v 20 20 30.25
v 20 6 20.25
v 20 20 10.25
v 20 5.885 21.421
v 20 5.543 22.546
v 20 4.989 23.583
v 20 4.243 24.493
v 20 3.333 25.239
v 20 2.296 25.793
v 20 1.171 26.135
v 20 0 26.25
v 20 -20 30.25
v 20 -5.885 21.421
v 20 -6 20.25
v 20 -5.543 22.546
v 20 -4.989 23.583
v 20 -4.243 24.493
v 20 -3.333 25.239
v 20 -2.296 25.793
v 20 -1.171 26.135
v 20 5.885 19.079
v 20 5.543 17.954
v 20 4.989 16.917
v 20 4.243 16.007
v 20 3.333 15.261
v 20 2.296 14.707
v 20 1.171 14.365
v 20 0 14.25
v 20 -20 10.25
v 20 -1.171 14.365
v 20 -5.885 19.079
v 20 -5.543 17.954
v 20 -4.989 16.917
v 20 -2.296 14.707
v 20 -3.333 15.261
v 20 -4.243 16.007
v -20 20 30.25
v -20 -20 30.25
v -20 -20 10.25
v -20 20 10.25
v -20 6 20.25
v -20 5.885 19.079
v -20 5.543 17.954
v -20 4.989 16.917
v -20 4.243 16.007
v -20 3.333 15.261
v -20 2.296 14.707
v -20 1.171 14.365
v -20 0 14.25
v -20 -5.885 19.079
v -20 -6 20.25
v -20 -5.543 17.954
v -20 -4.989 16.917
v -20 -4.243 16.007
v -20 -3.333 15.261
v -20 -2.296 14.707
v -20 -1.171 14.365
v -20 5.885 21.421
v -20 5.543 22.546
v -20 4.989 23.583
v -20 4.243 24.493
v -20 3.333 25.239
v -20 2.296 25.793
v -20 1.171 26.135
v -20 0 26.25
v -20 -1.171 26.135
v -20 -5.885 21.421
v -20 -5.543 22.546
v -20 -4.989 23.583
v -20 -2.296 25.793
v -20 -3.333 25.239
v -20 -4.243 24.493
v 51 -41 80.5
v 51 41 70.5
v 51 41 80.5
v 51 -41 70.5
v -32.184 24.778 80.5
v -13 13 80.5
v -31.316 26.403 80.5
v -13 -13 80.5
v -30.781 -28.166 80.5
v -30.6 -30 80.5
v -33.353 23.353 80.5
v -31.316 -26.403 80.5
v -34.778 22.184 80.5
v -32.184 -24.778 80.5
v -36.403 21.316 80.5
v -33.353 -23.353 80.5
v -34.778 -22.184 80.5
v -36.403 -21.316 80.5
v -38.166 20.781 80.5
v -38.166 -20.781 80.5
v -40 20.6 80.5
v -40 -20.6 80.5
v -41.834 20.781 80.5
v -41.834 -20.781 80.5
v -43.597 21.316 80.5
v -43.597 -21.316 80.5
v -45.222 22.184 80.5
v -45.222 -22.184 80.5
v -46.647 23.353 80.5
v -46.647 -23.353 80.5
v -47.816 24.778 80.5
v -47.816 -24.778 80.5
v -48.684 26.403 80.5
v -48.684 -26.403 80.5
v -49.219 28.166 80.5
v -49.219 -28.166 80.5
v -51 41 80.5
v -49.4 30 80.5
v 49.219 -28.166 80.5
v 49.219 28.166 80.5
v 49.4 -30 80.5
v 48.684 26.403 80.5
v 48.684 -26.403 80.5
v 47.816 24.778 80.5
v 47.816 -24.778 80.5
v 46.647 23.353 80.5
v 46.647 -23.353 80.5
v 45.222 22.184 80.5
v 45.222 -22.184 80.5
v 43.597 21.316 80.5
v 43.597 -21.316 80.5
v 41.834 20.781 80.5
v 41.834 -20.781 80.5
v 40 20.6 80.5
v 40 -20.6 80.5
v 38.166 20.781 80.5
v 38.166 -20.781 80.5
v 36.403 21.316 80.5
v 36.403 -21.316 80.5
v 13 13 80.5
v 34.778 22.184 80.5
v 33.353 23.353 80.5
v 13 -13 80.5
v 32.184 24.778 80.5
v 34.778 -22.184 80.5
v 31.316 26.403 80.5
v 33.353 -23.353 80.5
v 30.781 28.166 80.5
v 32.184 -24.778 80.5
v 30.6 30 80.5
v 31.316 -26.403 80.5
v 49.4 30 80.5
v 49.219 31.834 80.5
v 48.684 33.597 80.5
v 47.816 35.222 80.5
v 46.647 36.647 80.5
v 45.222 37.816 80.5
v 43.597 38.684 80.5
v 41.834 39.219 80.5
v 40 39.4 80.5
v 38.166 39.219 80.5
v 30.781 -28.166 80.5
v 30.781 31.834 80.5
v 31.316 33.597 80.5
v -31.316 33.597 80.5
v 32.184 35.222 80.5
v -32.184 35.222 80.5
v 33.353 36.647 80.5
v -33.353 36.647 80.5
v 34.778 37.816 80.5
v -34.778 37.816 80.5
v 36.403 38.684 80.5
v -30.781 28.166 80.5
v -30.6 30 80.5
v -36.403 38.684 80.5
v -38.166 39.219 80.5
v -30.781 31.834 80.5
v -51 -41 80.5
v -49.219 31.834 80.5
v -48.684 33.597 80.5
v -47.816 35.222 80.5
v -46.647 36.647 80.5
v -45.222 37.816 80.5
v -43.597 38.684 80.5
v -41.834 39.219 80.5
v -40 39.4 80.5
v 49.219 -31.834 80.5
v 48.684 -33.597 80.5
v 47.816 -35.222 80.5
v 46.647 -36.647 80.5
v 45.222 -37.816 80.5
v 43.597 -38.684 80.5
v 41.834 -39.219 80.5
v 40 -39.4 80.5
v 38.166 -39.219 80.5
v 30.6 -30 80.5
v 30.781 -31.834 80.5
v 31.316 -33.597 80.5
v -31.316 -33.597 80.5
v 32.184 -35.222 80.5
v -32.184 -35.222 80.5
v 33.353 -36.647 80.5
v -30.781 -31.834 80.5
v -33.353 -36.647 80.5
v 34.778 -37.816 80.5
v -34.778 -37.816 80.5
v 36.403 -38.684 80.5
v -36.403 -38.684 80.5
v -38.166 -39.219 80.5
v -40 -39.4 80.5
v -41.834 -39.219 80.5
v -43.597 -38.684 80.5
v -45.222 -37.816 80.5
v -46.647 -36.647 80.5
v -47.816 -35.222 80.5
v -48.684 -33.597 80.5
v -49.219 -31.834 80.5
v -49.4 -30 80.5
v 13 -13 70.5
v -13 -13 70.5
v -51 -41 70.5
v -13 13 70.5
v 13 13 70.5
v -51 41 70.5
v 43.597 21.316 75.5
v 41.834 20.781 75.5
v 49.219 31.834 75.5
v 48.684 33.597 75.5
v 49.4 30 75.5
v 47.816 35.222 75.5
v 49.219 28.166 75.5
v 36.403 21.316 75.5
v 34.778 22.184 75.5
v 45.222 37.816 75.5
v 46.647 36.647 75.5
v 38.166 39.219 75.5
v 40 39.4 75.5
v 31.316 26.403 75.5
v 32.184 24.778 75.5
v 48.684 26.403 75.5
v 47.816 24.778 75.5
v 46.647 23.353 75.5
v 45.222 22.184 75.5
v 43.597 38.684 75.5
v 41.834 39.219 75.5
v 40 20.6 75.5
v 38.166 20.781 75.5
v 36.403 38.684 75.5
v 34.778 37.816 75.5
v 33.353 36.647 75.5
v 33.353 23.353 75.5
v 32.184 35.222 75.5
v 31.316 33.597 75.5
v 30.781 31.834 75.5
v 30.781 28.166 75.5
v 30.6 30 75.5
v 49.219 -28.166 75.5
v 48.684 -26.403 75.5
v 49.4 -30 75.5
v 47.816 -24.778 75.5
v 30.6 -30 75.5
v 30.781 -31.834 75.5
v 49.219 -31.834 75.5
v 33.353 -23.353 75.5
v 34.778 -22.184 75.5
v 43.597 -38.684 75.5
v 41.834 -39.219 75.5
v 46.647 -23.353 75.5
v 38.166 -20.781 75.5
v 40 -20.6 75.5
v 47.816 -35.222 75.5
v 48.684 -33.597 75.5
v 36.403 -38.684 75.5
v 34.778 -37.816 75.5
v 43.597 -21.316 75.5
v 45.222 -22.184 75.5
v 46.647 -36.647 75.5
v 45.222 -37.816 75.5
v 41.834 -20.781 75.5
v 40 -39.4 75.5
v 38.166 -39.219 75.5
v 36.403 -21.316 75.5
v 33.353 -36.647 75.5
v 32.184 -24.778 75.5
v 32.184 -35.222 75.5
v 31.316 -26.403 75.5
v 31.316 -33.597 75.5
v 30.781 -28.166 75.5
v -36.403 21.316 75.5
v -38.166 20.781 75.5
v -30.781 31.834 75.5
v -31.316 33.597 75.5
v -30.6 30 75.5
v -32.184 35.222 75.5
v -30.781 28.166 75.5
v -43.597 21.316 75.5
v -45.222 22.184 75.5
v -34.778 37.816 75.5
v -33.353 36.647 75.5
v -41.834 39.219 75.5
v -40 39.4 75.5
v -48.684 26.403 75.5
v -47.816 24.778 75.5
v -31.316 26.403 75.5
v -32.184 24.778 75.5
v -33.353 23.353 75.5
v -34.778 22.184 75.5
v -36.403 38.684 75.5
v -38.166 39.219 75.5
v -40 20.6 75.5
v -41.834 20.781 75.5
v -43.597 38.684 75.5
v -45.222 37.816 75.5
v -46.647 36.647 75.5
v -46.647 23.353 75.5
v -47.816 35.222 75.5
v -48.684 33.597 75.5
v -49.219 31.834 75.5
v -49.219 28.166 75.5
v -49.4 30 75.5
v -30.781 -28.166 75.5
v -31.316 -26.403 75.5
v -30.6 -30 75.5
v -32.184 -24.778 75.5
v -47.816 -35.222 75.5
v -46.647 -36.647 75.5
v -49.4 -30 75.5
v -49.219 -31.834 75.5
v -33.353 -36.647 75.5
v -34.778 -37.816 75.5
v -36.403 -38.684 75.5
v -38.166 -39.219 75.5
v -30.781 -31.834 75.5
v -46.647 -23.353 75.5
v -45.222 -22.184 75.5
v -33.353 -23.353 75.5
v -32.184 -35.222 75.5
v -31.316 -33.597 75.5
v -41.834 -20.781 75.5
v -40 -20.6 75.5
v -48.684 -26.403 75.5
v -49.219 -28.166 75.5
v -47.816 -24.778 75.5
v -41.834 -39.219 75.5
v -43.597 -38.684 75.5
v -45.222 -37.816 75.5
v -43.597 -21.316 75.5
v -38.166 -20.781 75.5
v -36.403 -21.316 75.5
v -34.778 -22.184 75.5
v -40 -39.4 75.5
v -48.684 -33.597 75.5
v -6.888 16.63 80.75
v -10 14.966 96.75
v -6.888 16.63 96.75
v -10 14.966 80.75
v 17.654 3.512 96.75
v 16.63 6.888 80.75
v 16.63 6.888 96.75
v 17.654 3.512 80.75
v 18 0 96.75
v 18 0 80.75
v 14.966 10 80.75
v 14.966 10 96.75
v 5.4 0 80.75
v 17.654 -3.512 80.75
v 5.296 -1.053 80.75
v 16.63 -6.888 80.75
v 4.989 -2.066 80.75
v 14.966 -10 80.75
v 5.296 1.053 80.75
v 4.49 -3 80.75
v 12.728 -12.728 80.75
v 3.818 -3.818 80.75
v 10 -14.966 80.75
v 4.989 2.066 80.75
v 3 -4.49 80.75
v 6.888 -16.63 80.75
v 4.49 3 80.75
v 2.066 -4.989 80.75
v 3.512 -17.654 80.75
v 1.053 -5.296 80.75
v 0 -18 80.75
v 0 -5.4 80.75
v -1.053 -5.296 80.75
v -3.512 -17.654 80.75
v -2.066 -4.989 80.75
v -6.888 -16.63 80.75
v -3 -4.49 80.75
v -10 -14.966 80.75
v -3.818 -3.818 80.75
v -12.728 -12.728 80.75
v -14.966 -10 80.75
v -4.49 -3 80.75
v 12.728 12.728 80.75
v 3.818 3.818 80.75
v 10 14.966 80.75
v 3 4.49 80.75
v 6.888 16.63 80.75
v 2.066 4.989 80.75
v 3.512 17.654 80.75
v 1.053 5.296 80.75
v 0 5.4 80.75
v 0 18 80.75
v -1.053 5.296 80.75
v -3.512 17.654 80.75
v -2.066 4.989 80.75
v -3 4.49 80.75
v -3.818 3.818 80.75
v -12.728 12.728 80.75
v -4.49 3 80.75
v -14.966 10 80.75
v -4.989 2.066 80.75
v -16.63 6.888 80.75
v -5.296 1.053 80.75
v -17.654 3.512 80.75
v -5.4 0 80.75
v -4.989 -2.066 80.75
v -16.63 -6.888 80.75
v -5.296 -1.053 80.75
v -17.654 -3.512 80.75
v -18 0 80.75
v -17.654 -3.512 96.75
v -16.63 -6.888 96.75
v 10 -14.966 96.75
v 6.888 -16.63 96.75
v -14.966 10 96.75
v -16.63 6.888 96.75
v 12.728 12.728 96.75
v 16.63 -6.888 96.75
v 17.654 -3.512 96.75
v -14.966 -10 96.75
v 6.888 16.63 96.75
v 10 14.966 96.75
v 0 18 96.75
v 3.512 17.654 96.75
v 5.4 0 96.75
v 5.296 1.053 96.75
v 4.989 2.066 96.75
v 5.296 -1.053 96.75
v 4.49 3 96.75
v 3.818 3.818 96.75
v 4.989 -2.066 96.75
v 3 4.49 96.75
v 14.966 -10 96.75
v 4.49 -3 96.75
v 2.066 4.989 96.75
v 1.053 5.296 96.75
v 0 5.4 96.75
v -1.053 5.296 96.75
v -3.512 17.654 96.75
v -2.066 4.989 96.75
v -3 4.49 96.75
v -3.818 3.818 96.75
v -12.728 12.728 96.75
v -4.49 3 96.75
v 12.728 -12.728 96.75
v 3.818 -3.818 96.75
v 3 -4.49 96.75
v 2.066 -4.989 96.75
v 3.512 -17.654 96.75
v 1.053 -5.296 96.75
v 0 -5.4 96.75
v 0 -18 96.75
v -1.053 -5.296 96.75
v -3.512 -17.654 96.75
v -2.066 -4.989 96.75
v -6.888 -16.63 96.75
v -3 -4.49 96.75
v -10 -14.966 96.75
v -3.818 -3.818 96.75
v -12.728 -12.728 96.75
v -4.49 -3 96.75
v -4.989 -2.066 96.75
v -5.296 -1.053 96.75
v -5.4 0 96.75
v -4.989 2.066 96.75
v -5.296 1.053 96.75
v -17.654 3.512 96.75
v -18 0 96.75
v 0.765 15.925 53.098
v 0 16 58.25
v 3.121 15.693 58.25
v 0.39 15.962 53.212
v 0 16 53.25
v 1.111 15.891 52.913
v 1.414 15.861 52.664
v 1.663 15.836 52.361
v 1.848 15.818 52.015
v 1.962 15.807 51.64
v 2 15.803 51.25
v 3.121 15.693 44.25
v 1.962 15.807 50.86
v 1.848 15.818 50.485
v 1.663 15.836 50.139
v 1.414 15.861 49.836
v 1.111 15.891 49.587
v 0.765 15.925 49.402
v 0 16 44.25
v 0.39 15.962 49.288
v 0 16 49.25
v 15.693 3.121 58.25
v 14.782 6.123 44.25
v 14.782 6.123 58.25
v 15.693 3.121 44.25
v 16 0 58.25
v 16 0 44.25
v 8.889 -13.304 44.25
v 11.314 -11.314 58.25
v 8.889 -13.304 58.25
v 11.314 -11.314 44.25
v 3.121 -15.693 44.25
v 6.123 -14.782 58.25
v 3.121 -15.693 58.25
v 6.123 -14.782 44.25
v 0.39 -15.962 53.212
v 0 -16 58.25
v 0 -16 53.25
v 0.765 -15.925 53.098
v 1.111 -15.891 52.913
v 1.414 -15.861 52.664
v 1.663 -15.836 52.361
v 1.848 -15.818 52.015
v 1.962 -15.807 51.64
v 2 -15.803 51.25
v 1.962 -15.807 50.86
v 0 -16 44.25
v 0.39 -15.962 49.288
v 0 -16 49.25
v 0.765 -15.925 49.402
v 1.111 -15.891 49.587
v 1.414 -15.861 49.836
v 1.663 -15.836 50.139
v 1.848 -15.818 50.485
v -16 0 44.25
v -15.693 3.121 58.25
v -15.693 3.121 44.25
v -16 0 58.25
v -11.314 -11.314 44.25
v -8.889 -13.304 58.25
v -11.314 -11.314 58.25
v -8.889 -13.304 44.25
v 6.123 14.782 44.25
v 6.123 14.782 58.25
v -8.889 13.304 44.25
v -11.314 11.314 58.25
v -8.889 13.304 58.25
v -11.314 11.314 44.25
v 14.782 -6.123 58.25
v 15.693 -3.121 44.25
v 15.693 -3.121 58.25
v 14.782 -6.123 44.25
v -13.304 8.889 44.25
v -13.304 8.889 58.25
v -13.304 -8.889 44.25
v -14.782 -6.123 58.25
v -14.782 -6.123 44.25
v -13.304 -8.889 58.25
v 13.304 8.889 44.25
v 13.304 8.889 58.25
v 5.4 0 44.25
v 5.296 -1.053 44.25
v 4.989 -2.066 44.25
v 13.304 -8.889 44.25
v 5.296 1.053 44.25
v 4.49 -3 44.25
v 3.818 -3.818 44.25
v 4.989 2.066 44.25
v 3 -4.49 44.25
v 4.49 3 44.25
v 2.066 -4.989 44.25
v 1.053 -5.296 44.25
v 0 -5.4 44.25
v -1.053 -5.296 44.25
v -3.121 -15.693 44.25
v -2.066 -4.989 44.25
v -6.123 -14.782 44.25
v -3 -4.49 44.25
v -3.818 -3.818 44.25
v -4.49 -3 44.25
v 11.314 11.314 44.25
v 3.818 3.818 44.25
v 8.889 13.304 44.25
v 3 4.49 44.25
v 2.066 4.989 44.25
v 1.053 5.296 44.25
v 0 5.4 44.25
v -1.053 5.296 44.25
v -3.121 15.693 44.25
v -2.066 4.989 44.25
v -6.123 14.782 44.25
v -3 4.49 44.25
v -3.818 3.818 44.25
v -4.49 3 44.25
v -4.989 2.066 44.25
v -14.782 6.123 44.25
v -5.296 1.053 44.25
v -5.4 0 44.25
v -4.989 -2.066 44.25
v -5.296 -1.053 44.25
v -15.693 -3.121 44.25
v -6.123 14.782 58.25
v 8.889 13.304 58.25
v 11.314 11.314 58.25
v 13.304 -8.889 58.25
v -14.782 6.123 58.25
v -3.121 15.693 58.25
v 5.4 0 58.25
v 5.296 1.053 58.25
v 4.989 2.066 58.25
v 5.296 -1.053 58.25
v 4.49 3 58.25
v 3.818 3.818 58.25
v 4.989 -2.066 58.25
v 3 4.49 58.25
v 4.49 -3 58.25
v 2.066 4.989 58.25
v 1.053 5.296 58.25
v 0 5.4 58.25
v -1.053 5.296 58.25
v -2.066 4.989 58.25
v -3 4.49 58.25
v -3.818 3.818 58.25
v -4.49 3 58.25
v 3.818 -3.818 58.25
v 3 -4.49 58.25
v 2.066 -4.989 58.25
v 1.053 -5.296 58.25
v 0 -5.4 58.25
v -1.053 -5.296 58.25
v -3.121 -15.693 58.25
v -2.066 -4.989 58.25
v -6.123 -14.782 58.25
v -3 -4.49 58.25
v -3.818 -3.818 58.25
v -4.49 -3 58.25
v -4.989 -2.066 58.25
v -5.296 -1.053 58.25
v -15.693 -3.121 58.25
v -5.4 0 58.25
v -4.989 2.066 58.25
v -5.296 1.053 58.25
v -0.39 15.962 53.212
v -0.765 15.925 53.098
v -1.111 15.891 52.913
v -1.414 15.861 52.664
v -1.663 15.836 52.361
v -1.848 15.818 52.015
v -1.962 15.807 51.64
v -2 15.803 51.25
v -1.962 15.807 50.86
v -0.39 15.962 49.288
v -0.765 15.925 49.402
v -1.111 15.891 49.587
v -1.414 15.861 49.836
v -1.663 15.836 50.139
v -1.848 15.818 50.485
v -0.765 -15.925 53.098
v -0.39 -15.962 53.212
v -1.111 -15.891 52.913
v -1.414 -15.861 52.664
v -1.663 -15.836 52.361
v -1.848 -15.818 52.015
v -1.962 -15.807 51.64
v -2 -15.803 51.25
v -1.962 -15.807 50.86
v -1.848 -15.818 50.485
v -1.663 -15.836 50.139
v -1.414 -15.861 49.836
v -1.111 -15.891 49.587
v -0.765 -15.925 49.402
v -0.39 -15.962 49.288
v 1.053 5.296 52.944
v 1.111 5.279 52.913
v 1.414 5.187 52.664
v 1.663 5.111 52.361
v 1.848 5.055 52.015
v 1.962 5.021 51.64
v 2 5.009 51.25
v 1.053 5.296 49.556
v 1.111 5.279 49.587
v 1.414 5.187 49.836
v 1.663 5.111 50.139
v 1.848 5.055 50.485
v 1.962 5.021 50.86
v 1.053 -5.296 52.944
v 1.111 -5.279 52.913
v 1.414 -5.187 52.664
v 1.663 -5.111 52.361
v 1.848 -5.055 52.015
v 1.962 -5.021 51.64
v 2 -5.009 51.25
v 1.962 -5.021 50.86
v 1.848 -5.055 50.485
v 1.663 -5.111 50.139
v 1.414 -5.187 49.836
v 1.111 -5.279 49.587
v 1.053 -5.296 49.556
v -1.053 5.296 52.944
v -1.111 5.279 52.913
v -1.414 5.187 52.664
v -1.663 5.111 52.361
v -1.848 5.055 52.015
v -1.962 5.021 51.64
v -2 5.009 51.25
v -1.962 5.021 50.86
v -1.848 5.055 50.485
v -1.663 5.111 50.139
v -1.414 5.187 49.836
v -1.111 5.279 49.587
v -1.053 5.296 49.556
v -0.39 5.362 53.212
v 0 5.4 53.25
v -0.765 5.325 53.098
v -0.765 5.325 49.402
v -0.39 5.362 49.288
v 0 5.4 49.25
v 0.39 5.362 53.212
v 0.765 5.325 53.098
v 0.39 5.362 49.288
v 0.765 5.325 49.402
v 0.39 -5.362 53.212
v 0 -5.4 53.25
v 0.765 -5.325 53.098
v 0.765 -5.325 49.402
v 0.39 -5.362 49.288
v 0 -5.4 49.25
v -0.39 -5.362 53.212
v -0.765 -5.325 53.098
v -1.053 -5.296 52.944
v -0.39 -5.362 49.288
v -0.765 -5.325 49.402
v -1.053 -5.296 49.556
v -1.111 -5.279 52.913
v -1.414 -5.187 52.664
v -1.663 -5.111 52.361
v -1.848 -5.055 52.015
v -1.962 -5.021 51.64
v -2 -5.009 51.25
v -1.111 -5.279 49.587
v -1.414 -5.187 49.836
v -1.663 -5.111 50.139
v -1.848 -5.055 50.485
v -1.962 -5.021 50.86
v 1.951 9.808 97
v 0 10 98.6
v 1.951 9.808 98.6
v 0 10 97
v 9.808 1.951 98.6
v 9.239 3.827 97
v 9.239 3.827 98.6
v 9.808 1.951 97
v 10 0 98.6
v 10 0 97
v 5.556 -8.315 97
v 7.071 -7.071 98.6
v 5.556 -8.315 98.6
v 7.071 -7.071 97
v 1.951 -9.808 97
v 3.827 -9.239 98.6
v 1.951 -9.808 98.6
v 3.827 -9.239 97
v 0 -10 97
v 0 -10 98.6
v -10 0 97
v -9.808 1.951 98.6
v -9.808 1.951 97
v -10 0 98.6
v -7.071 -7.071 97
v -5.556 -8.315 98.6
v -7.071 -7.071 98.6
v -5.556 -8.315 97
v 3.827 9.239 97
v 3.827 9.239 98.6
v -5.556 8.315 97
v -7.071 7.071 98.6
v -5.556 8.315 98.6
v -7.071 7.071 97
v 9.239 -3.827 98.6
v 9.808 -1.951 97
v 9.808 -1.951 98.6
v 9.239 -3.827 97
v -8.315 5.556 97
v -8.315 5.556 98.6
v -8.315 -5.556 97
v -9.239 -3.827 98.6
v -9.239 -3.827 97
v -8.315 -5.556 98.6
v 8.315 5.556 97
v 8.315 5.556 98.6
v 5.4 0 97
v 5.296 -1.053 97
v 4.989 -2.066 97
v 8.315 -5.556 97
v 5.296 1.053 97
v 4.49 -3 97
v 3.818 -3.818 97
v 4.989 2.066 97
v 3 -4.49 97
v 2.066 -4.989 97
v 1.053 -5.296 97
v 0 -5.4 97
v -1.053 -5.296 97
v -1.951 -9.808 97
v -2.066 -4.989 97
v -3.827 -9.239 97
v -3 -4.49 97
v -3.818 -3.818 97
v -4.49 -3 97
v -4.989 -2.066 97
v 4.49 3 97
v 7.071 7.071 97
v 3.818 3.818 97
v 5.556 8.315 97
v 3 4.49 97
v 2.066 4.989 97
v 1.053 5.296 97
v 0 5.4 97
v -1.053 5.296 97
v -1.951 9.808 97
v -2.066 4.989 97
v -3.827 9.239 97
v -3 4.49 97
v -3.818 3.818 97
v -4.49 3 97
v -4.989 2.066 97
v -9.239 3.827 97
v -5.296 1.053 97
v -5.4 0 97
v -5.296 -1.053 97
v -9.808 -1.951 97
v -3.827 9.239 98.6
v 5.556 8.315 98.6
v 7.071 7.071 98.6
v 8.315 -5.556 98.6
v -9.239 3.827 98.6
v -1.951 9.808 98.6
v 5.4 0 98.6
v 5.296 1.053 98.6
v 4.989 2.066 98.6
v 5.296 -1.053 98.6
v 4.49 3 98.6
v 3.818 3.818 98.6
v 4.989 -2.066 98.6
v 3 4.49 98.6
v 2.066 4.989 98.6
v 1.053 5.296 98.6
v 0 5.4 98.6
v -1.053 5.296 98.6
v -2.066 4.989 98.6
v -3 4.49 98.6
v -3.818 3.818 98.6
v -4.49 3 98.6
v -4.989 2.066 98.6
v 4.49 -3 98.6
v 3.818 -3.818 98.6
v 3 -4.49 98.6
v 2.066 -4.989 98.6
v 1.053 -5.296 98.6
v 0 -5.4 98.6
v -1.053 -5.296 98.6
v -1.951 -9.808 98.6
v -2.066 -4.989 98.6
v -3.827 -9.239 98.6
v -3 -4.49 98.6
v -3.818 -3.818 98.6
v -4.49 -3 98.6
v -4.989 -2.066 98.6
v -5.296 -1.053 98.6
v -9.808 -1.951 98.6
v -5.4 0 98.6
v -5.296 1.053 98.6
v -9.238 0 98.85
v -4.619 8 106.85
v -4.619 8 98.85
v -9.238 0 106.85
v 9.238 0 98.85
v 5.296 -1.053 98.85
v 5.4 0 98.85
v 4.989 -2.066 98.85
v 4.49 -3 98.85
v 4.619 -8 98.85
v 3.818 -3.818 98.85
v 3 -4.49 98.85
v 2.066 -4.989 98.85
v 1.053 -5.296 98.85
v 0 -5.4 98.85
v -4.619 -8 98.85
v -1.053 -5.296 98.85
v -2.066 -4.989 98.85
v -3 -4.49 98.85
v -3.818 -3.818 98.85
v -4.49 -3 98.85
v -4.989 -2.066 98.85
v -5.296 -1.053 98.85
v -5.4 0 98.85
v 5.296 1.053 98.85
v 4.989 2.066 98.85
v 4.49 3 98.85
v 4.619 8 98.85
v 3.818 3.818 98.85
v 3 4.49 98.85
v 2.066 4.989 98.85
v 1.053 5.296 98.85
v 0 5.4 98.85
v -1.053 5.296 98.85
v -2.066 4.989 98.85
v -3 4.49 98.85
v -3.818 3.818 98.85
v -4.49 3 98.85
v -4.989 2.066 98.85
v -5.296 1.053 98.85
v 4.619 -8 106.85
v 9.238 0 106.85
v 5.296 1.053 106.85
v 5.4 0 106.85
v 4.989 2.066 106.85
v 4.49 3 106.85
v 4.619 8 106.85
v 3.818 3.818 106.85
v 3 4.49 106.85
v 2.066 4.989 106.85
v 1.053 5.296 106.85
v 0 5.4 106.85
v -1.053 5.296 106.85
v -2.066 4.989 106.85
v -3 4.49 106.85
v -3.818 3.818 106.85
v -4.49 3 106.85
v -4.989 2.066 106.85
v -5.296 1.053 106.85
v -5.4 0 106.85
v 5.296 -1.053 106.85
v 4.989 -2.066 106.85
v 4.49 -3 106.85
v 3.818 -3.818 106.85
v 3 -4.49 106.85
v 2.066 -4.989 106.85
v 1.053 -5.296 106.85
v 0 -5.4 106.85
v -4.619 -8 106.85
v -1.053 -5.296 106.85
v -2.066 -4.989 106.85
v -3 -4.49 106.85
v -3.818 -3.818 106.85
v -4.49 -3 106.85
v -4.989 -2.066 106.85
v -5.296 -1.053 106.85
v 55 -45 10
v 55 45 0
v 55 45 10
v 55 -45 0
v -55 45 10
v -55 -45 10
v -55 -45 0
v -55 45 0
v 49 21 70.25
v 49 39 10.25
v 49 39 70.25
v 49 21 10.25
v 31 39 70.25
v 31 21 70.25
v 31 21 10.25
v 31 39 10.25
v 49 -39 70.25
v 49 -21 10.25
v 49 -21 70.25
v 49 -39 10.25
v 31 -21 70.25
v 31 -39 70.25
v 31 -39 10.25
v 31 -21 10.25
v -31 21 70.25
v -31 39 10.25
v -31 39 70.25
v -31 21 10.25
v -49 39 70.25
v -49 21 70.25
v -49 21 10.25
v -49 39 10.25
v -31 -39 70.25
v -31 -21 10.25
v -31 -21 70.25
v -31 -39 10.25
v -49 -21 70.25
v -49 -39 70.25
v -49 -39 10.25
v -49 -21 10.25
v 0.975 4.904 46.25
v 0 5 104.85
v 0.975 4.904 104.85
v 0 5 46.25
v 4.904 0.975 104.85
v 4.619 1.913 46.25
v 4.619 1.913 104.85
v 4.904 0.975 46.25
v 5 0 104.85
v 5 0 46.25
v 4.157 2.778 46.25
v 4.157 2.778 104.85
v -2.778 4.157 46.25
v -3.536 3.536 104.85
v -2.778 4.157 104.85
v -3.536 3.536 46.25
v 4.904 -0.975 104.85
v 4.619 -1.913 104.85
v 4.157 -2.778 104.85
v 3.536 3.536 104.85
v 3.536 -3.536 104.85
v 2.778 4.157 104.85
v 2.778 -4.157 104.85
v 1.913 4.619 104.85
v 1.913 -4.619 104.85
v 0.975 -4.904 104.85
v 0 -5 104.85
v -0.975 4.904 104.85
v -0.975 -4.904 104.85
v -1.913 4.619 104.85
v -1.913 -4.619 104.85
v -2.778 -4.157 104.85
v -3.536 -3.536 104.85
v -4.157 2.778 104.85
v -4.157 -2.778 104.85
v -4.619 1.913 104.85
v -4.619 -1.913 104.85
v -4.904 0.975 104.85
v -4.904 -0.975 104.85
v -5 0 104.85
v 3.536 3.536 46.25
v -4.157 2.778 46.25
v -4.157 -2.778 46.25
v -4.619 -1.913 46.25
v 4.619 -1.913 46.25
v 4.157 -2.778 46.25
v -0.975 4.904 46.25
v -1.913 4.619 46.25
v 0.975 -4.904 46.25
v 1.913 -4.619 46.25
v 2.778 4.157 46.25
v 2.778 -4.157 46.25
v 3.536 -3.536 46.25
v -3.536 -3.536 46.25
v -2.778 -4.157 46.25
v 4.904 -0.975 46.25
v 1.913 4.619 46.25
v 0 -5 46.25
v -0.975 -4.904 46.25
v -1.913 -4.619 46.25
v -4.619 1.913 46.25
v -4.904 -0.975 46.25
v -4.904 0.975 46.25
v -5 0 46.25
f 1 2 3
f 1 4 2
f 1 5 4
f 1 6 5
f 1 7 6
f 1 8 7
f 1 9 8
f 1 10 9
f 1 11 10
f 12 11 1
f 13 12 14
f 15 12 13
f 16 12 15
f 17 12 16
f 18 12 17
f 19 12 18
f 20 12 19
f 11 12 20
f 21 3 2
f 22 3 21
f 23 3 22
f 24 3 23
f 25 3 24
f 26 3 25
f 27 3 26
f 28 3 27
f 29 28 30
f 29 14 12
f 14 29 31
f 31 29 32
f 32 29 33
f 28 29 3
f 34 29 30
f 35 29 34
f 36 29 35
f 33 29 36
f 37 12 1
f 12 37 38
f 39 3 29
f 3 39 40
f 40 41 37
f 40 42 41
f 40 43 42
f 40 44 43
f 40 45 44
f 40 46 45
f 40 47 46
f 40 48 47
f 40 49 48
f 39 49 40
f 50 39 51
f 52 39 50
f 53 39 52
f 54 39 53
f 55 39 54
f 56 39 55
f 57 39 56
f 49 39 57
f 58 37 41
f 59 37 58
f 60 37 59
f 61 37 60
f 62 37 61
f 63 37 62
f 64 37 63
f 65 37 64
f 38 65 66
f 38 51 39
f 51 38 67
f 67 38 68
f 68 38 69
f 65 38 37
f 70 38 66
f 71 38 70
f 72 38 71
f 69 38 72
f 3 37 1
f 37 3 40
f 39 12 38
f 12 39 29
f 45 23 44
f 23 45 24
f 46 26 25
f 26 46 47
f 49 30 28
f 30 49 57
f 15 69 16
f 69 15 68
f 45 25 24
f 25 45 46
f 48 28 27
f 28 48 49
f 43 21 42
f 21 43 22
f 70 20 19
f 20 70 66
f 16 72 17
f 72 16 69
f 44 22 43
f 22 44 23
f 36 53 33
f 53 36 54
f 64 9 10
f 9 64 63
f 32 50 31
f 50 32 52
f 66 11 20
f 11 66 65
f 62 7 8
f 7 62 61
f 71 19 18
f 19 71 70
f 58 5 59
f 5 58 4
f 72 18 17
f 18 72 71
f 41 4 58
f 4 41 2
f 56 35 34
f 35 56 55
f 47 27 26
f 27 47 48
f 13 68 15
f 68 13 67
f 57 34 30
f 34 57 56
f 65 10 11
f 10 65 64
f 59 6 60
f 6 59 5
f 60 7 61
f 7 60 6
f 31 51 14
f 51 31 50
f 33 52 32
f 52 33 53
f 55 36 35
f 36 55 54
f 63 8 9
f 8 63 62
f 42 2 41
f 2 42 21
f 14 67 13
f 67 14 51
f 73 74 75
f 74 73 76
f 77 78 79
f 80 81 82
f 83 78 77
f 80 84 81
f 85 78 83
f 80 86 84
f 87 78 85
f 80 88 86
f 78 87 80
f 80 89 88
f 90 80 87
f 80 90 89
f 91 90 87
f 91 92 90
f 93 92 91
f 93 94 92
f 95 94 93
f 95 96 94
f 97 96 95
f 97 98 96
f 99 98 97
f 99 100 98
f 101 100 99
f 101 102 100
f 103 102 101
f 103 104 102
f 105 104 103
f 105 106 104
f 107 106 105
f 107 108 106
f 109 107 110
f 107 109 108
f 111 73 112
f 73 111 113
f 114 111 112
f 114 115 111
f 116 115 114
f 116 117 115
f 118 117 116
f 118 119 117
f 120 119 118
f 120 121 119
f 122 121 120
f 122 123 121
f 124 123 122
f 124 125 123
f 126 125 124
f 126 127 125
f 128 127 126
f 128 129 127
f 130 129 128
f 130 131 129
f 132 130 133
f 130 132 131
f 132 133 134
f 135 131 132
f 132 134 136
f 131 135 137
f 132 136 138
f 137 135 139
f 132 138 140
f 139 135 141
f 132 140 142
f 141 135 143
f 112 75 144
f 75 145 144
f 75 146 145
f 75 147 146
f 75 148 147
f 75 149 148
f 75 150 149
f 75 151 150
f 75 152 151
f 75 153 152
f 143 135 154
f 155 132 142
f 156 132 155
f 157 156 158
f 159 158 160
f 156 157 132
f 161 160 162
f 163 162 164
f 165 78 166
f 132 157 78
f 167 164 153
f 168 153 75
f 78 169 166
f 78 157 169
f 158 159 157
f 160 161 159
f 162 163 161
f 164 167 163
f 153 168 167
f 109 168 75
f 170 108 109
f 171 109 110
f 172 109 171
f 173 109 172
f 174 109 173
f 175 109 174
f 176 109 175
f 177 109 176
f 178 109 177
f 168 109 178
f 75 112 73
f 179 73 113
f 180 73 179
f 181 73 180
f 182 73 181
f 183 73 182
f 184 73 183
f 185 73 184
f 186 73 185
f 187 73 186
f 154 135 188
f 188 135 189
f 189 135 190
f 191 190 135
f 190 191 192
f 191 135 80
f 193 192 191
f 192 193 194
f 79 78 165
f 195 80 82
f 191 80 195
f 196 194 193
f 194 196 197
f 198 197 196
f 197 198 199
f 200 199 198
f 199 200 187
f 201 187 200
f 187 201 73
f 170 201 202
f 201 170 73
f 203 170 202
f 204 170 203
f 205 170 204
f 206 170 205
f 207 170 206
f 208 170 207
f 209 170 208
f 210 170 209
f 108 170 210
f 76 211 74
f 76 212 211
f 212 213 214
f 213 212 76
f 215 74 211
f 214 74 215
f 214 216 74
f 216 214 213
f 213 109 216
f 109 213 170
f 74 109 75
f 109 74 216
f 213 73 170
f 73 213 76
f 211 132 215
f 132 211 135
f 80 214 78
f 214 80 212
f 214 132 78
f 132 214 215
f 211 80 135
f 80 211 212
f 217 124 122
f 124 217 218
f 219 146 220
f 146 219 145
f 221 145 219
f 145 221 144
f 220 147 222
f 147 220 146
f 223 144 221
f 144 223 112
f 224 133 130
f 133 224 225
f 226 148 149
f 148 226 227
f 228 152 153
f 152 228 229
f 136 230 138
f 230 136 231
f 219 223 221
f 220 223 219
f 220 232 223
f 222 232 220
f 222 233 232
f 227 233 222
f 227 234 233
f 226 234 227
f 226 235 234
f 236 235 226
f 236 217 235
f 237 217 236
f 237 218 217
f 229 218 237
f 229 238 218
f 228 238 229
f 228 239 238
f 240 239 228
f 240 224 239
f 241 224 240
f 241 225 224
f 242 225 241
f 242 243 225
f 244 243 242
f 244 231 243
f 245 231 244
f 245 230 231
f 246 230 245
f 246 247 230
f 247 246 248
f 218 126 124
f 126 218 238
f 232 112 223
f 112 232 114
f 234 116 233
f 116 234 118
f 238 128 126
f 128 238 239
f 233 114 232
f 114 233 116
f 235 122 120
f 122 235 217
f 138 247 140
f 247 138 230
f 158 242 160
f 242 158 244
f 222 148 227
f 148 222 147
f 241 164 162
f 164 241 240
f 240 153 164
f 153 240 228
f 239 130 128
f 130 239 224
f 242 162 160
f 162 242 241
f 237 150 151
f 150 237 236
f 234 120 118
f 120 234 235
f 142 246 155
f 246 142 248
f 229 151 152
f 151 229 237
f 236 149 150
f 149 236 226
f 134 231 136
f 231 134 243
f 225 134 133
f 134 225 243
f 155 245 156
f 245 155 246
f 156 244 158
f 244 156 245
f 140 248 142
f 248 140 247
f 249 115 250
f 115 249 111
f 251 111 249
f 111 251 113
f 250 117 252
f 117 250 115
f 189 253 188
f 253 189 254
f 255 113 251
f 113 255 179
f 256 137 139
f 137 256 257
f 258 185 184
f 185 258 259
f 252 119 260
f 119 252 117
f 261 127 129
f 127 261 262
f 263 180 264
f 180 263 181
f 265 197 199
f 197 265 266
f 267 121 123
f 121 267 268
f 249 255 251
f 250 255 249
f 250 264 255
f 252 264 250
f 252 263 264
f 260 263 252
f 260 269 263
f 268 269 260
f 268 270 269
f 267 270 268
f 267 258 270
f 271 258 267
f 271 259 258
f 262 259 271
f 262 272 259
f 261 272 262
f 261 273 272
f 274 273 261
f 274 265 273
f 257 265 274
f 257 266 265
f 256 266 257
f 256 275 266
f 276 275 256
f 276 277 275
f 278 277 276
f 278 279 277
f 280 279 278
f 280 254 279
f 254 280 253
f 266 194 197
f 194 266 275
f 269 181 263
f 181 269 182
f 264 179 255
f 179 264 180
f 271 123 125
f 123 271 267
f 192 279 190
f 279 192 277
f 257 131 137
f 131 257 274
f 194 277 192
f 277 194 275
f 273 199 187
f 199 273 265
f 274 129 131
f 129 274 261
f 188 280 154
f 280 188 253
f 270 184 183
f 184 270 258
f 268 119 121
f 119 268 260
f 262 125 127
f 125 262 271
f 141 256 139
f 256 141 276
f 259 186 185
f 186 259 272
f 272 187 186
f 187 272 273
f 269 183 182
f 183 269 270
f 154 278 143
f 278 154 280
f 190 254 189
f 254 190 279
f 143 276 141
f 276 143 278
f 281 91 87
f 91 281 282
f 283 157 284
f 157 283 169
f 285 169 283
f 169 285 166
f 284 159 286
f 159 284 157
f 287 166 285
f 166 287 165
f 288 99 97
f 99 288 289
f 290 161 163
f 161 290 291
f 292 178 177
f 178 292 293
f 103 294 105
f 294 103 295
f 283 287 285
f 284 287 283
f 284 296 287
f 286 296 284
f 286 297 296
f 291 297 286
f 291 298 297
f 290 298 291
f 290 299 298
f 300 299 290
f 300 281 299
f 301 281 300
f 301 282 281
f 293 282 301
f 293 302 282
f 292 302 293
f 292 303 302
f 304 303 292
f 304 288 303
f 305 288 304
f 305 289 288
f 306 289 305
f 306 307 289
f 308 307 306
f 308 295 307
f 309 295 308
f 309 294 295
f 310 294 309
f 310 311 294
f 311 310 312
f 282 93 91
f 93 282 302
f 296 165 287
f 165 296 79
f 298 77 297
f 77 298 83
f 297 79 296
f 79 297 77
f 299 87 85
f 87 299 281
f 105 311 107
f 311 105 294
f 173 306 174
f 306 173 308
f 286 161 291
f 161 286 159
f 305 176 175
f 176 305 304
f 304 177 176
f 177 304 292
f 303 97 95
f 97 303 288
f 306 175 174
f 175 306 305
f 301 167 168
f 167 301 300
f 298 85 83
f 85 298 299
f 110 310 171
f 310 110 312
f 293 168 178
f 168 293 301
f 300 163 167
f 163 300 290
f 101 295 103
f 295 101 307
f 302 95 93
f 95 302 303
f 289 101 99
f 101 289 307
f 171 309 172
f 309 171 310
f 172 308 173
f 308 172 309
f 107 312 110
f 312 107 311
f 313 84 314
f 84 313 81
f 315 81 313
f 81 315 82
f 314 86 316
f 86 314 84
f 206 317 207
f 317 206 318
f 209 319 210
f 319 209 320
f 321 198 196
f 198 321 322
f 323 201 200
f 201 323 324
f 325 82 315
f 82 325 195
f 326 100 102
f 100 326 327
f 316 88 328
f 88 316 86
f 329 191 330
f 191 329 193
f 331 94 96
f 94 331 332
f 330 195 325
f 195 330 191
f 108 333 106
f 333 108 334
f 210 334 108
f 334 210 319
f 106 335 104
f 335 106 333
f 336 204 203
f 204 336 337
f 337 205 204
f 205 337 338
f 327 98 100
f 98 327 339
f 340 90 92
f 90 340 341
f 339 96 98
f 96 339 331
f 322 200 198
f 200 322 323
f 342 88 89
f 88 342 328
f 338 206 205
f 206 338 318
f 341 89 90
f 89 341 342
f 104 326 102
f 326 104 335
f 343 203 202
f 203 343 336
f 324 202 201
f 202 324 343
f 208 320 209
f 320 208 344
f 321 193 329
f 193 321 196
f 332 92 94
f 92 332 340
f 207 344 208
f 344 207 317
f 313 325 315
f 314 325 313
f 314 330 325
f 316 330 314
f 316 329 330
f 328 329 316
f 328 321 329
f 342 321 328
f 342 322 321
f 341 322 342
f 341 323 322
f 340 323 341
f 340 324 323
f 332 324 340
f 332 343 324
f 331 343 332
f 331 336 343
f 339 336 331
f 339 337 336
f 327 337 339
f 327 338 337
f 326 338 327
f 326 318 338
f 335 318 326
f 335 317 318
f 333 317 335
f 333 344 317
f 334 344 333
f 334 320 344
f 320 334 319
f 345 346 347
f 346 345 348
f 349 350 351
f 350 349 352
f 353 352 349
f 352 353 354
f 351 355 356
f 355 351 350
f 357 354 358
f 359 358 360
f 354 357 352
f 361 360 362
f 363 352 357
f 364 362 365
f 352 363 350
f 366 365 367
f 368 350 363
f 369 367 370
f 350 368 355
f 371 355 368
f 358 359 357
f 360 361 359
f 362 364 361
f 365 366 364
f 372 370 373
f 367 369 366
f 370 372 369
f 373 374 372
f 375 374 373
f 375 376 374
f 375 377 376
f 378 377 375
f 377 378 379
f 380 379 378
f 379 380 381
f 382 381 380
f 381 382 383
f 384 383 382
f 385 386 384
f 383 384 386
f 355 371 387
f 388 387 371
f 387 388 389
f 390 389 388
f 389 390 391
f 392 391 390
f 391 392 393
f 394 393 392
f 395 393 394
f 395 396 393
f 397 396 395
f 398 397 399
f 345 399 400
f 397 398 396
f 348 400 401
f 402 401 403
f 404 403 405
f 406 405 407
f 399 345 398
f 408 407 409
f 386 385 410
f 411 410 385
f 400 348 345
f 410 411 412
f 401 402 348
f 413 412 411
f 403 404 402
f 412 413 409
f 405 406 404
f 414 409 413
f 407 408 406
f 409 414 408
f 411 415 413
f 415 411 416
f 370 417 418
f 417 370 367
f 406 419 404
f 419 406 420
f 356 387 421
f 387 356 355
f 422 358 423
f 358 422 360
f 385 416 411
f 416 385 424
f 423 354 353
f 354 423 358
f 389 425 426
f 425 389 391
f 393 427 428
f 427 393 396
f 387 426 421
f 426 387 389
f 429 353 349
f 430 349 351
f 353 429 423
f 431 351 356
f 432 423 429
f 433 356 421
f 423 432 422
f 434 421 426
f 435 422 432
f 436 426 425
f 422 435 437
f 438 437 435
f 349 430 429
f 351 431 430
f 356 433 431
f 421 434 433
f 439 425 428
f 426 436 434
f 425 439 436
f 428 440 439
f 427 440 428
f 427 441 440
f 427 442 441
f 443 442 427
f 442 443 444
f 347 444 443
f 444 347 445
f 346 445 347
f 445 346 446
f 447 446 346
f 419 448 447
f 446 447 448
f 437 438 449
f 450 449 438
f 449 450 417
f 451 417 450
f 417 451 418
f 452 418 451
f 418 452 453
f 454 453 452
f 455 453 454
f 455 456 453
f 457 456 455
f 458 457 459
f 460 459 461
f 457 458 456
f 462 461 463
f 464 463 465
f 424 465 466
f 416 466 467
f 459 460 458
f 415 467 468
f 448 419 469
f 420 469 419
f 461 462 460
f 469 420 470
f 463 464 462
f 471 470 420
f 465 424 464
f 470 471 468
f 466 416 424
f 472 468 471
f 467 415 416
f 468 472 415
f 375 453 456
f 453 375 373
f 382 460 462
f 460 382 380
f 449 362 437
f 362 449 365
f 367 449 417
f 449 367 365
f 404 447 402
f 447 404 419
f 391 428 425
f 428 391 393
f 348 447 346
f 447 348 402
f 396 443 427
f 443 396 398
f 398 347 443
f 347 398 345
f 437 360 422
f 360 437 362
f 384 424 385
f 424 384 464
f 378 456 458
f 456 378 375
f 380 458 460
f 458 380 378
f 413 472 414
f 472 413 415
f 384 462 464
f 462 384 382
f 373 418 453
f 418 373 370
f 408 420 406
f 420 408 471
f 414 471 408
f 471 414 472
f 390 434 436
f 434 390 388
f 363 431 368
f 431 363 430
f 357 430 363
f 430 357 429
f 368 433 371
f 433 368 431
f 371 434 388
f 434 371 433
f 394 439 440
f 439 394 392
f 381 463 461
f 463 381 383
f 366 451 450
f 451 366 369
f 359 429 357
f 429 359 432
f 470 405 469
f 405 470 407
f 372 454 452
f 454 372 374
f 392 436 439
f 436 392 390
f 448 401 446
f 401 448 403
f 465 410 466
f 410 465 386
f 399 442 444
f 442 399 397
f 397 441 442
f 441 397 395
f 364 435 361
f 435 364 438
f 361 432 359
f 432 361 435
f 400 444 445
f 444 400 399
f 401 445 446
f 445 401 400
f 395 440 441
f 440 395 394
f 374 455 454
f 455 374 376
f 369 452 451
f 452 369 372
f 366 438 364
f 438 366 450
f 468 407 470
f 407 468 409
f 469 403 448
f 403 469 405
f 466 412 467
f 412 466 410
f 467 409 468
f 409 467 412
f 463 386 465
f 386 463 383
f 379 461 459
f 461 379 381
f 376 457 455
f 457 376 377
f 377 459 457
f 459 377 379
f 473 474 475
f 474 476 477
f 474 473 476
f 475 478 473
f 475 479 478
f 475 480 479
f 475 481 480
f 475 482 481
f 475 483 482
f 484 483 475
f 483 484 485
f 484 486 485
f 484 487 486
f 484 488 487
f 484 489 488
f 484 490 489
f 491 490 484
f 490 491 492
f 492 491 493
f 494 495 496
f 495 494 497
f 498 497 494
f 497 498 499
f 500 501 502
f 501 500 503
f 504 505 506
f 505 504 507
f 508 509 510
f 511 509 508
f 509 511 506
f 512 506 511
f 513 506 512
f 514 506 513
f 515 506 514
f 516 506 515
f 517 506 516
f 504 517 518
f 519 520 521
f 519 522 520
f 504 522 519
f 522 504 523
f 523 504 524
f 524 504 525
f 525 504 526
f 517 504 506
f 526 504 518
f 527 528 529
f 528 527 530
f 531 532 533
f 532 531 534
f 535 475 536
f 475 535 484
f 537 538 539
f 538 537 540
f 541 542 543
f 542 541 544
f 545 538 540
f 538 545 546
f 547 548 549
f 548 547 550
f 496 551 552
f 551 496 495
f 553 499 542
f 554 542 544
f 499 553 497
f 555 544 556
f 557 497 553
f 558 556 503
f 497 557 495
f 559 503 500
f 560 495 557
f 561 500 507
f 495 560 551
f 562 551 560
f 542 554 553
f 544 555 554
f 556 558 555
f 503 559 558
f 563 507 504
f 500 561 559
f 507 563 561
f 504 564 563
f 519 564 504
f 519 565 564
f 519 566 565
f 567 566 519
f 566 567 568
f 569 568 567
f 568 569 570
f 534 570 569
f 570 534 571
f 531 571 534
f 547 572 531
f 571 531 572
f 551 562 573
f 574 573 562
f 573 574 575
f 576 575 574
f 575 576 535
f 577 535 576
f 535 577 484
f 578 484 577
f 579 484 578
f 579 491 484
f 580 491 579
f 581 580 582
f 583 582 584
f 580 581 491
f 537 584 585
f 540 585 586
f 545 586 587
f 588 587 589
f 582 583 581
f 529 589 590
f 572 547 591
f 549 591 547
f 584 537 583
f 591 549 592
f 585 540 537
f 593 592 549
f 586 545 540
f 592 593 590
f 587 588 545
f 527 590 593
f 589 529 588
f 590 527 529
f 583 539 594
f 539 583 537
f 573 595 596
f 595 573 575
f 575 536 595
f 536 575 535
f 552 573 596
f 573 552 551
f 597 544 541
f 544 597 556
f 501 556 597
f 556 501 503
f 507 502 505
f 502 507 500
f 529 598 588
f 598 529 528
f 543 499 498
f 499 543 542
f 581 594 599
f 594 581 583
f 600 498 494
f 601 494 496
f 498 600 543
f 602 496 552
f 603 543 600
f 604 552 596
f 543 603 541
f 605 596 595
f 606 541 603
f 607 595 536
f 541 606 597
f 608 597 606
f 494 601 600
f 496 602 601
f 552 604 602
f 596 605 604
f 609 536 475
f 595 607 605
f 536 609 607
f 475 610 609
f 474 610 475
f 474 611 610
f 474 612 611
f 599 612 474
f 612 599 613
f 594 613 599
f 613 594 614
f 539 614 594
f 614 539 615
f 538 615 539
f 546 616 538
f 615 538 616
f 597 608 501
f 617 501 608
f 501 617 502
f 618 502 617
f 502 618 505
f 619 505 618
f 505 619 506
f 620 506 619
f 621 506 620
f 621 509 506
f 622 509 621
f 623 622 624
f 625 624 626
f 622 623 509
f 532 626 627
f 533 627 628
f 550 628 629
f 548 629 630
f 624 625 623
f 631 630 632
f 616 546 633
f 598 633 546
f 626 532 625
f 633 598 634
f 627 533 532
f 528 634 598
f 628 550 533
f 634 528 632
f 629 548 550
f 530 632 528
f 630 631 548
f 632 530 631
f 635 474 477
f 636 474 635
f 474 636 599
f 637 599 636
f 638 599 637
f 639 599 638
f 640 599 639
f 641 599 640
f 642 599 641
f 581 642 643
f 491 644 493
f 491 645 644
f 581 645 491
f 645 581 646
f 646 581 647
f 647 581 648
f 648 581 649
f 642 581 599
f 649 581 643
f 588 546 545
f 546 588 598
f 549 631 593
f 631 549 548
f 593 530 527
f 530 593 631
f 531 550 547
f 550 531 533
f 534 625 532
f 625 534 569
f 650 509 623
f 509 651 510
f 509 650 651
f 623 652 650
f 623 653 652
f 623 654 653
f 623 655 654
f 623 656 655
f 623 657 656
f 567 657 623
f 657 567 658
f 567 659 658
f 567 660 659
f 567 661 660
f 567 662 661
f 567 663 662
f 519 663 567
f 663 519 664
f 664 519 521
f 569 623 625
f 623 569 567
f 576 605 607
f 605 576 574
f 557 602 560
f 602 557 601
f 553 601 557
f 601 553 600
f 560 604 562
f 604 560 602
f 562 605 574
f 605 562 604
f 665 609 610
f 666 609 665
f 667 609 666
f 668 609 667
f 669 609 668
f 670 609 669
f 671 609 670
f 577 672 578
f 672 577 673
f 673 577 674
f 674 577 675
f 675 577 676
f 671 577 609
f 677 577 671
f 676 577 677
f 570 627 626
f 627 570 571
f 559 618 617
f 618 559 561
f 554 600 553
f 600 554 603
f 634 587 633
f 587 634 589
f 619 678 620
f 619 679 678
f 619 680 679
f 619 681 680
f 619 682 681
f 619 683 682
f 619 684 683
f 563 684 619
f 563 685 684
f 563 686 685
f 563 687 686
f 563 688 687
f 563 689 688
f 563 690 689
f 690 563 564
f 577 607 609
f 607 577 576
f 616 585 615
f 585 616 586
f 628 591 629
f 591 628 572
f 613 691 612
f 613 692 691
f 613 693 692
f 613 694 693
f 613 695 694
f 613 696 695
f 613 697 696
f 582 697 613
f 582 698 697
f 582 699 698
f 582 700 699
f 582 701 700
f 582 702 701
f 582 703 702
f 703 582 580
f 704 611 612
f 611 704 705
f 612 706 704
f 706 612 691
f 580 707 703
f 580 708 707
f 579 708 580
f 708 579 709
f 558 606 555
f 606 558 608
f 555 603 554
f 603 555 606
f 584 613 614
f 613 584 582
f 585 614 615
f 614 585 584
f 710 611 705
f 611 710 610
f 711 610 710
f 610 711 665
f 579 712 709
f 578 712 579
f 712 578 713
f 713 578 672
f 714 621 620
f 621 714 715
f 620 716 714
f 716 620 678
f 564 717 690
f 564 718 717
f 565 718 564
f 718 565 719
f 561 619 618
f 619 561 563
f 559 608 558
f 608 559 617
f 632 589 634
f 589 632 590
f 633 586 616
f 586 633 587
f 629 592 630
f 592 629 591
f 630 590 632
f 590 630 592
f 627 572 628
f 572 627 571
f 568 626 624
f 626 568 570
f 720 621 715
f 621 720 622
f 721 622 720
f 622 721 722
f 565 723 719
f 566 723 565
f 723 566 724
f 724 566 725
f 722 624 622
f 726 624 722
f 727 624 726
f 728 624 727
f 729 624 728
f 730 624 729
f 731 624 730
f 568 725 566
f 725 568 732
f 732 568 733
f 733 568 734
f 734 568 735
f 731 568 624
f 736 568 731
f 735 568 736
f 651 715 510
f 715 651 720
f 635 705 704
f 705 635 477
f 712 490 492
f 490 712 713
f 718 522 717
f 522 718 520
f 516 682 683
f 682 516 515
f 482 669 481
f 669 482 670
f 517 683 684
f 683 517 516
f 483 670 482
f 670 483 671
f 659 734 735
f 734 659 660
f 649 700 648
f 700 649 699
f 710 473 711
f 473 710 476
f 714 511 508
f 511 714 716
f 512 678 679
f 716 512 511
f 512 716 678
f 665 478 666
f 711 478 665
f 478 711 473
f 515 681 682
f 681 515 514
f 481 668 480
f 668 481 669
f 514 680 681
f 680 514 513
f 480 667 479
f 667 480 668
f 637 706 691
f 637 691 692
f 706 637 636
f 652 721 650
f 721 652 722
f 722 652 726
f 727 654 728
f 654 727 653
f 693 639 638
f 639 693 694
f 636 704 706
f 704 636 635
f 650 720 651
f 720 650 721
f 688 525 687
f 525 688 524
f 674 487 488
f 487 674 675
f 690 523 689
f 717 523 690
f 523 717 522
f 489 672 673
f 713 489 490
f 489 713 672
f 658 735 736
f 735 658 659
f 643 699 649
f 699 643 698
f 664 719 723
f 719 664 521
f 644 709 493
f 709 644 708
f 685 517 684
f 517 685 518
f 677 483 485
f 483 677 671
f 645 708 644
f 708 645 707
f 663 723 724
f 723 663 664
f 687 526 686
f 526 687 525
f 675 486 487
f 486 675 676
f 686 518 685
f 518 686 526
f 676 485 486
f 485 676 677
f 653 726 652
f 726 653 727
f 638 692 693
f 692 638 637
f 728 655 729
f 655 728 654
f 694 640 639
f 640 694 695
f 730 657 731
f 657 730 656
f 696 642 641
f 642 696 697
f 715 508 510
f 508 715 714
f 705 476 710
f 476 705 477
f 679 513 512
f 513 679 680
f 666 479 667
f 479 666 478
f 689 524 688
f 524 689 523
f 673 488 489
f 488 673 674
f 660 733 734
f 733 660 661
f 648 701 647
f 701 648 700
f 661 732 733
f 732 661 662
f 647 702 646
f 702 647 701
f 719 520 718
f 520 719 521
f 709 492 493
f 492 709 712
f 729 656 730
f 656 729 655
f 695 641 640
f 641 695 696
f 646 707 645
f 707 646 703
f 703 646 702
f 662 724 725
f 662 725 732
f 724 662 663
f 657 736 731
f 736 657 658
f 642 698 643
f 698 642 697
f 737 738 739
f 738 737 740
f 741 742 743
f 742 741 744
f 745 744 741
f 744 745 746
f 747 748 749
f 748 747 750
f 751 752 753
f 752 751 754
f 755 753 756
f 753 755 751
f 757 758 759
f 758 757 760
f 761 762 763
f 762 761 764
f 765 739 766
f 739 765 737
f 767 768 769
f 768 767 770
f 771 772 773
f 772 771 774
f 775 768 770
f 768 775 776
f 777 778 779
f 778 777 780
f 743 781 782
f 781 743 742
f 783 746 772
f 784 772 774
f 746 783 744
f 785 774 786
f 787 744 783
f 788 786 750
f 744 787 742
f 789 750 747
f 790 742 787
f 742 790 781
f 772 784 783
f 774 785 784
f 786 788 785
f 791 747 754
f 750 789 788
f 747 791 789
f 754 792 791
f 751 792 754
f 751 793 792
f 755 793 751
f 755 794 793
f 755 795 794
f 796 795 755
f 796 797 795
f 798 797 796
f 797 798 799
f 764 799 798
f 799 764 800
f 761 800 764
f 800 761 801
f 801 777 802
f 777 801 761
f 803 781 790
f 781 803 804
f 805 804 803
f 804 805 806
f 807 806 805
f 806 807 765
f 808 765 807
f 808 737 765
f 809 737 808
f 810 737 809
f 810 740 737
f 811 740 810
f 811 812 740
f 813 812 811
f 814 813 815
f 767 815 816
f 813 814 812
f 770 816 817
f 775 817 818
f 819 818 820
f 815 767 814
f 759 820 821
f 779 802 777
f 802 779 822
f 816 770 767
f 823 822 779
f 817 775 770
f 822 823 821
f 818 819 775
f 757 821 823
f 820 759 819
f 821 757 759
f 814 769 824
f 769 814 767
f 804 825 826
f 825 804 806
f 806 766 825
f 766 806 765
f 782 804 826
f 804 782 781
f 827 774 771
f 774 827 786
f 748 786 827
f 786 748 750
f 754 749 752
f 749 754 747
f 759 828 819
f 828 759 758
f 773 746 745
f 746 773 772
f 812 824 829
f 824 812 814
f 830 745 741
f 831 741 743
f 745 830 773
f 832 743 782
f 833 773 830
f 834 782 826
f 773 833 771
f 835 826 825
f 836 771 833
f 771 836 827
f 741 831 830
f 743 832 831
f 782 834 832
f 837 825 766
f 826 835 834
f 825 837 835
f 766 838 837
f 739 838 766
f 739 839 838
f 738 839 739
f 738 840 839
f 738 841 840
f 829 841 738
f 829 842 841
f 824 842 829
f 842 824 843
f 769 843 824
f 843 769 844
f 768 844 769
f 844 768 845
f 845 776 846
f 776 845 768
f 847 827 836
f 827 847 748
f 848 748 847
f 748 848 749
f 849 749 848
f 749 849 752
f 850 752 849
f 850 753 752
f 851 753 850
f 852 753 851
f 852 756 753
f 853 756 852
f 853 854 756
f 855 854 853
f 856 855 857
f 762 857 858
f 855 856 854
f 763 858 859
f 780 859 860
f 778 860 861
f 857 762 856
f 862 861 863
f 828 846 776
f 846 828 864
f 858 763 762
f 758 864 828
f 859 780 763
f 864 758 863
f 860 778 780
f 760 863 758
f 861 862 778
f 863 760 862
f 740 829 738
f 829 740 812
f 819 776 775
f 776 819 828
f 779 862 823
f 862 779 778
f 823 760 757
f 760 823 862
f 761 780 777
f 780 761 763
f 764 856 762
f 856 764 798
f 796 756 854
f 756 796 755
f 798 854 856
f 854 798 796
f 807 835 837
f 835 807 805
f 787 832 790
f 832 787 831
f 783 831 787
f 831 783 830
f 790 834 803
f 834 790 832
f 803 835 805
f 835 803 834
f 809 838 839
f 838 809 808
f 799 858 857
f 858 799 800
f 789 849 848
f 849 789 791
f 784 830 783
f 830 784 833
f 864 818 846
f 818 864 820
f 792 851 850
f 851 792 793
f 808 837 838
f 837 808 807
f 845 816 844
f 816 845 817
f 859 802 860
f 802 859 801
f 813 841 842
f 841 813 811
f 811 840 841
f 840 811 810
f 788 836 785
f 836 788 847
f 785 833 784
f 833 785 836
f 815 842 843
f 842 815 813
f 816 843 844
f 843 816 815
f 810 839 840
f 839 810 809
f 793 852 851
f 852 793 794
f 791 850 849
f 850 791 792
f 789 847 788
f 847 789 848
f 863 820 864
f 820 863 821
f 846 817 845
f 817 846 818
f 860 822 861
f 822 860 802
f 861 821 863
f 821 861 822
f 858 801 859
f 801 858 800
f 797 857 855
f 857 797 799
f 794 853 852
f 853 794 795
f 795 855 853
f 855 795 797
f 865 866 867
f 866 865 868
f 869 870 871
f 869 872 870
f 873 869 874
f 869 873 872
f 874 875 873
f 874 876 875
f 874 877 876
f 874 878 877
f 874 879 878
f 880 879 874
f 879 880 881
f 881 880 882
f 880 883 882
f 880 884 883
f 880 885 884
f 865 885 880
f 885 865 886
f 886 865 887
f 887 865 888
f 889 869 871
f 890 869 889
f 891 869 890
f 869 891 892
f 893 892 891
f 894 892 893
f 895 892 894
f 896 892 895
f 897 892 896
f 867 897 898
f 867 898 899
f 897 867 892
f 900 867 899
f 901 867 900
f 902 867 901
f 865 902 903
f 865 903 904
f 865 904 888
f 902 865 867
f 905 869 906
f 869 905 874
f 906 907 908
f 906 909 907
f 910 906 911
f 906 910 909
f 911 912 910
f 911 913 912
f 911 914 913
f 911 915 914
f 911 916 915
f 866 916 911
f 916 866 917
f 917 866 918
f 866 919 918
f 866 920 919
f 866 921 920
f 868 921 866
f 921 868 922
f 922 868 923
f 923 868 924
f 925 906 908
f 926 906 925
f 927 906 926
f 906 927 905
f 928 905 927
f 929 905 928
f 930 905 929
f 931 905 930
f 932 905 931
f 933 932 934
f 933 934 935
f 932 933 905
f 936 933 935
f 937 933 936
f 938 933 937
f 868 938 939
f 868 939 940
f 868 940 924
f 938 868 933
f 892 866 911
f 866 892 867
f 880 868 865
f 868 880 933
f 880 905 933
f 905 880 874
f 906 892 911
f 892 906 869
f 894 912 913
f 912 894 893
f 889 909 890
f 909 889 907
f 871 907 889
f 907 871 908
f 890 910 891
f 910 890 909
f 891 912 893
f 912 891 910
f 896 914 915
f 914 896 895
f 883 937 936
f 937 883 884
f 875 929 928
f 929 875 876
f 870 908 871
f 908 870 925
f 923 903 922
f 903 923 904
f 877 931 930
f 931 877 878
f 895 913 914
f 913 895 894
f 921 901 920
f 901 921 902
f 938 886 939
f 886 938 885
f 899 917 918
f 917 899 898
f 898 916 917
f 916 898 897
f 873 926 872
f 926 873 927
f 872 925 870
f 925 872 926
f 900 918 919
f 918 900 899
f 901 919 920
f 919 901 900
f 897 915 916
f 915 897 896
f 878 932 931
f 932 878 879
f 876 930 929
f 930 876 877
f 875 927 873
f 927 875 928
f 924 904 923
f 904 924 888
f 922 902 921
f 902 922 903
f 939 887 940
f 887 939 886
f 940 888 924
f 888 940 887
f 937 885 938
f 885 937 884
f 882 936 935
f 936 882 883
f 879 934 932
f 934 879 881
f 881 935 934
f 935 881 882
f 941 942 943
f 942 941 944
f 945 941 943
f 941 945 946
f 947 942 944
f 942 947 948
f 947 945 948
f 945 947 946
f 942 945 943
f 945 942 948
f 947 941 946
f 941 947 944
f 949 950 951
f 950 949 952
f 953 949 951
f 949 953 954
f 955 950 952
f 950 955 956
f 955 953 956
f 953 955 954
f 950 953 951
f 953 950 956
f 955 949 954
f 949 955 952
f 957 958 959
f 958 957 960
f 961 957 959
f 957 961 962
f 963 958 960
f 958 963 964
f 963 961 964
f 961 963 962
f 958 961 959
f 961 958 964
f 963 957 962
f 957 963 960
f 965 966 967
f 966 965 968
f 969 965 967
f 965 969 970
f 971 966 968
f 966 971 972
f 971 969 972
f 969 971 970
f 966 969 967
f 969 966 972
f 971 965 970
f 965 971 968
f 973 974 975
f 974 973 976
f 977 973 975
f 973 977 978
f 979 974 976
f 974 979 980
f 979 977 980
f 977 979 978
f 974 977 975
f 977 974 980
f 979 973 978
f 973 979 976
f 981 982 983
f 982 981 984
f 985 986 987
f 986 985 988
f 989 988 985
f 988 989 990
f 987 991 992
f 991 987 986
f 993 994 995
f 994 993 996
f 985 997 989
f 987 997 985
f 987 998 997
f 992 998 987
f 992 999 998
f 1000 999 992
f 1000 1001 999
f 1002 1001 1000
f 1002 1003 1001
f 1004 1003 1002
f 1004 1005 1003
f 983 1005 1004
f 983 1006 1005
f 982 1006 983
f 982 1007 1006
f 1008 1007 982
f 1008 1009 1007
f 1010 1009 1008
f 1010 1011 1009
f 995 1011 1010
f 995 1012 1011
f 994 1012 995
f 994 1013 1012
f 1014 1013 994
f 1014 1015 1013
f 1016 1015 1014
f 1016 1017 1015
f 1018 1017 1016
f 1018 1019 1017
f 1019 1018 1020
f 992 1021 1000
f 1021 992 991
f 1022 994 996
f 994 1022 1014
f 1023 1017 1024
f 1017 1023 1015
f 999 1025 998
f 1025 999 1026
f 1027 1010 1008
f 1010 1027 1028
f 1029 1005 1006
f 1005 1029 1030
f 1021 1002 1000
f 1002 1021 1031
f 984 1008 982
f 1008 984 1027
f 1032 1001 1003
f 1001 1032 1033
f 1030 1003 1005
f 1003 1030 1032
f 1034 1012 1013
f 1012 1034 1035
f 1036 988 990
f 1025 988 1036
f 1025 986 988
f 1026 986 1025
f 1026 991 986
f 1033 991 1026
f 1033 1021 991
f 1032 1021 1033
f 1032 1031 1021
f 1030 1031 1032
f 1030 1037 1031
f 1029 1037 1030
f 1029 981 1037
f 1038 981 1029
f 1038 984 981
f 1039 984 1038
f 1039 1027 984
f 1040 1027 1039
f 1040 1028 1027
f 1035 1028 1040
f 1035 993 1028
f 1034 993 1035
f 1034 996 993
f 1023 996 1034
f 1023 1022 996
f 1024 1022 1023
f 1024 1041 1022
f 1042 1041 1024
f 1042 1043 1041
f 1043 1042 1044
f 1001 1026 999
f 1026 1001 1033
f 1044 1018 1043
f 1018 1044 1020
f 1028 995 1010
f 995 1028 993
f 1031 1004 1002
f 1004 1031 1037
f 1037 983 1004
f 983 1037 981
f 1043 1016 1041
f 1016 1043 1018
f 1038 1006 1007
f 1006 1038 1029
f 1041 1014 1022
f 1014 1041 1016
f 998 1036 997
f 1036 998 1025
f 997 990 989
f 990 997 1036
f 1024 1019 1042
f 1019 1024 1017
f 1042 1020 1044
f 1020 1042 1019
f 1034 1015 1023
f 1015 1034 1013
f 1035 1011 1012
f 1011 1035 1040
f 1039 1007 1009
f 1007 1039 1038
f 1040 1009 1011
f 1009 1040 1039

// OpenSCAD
$fn = 32;

// ------------------------------------------------------------------------
// Arbor press fixture: screw d10, posts 60 mm, gap 14 mm
// Every part is its own module, assembly() places every instance.
// ------------------------------------------------------------------------

// --- part 1 ---
module press_bed() {
  difference() {
    translate([-55, -45, 0]) cube([110, 90, 10]);
  }
}

// --- part 2 ---
module anvil_block() {
  difference() {
    translate([-20, -20, 0]) cube([40, 40, 20]);
    translate([0, 0, 10]) rotate([0, 90, 0]) cylinder(h = 42, d = 12, center = true);
  }
}

// --- part 3 ---
module press_post_a() {
  translate([-9, -9, 0]) cube([18, 18, 60]);
}

// --- part 4 ---
module press_post_b() {
  translate([-9, -9, 0]) cube([18, 18, 60]);
}

// --- part 5 ---
module press_post_c() {
  translate([-9, -9, 0]) cube([18, 18, 60]);
}

// --- part 6 ---
module press_post_d() {
  translate([-9, -9, 0]) cube([18, 18, 60]);
}

// --- part 7 ---
module press_frame() {
  difference() {
    translate([-51, -41, 0]) cube([102, 82, 10]);
    translate([-13, -13, -1]) cube([26, 26, 12]);
    translate([40, 30, 5]) cylinder(h = 6, d = 18.8);
    translate([40, -30, 5]) cylinder(h = 6, d = 18.8);
    translate([-40, 30, 5]) cylinder(h = 6, d = 18.8);
    translate([-40, -30, 5]) cylinder(h = 6, d = 18.8);
  }
}

// --- part 8 ---
module guide_ring() {
  difference() {
      translate([0, 0, 0]) cylinder(h = 16, d = 36);
      translate([0, 0, -1]) cylinder(h = 18, d = 10.8);
    }
}

// --- part 9 ---
module press_screw() {
  translate([0, 0, -29.3]) cylinder(h = 58.6, d = 10);
}

// --- part 10 ---
module press_head() {
  difference() {
    cylinder(h = 14, d = 32);
    translate([0, 0, -1]) cylinder(h = 16, d = 10.8);
    translate([0, 0, 7]) rotate([90, 0, 0]) cylinder(h = 34, d = 4, center = true);
  }
}

// --- part 11 ---
module nut_washer() {
  difference() {
      translate([0, 0, 0]) cylinder(h = 1.6, d = 20);
      translate([0, 0, -1]) cylinder(h = 3.6, d = 10.8);
    }
}

// --- part 12 ---
module press_nut() {
  difference() {
    linear_extrude(height = 8) polygon(points = [[9.238, 0], [4.619, 8], [-4.619, 8], [-9.238, 0], [-4.619, -8], [4.619, -8]]);
    translate([0, 0, -1]) cylinder(h = 10, d = 10.8);
  }
}

// --- assembly ---
module assembly() {
  color([0.80, 0.24, 0.20]) translate([0, 0, 0]) rotate([0, 0, 0]) press_bed();
  color([0.20, 0.45, 0.75]) translate([0, 0, 10.25]) rotate([0, 0, 0]) anvil_block();
  color([0.25, 0.62, 0.32]) translate([40, 30, 10.25]) rotate([0, 0, 0]) press_post_a();
  color([0.92, 0.70, 0.18]) translate([40, -30, 10.25]) rotate([0, 0, 0]) press_post_b();
  color([0.58, 0.35, 0.70]) translate([-40, 30, 10.25]) rotate([0, 0, 0]) press_post_c();
  color([0.16, 0.66, 0.66]) translate([-40, -30, 10.25]) rotate([0, 0, 0]) press_post_d();
  color([0.85, 0.48, 0.18]) translate([0, 0, 70.5]) rotate([0, 0, 0]) press_frame();
  color([0.55, 0.60, 0.65]) translate([0, 0, 80.75]) rotate([0, 0, 0]) guide_ring();
  color([0.75, 0.30, 0.55]) translate([0, 0, 75.55]) rotate([0, 0, 0]) press_screw();
  color([0.42, 0.52, 0.28]) translate([0, 0, 44.25]) rotate([0, 0, 0]) press_head();
  color([0.80, 0.24, 0.20]) translate([0, 0, 97]) rotate([0, 0, 0]) nut_washer();
  color([0.20, 0.45, 0.75]) translate([0, 0, 98.85]) rotate([0, 0, 0]) press_nut();
}

assembly();
